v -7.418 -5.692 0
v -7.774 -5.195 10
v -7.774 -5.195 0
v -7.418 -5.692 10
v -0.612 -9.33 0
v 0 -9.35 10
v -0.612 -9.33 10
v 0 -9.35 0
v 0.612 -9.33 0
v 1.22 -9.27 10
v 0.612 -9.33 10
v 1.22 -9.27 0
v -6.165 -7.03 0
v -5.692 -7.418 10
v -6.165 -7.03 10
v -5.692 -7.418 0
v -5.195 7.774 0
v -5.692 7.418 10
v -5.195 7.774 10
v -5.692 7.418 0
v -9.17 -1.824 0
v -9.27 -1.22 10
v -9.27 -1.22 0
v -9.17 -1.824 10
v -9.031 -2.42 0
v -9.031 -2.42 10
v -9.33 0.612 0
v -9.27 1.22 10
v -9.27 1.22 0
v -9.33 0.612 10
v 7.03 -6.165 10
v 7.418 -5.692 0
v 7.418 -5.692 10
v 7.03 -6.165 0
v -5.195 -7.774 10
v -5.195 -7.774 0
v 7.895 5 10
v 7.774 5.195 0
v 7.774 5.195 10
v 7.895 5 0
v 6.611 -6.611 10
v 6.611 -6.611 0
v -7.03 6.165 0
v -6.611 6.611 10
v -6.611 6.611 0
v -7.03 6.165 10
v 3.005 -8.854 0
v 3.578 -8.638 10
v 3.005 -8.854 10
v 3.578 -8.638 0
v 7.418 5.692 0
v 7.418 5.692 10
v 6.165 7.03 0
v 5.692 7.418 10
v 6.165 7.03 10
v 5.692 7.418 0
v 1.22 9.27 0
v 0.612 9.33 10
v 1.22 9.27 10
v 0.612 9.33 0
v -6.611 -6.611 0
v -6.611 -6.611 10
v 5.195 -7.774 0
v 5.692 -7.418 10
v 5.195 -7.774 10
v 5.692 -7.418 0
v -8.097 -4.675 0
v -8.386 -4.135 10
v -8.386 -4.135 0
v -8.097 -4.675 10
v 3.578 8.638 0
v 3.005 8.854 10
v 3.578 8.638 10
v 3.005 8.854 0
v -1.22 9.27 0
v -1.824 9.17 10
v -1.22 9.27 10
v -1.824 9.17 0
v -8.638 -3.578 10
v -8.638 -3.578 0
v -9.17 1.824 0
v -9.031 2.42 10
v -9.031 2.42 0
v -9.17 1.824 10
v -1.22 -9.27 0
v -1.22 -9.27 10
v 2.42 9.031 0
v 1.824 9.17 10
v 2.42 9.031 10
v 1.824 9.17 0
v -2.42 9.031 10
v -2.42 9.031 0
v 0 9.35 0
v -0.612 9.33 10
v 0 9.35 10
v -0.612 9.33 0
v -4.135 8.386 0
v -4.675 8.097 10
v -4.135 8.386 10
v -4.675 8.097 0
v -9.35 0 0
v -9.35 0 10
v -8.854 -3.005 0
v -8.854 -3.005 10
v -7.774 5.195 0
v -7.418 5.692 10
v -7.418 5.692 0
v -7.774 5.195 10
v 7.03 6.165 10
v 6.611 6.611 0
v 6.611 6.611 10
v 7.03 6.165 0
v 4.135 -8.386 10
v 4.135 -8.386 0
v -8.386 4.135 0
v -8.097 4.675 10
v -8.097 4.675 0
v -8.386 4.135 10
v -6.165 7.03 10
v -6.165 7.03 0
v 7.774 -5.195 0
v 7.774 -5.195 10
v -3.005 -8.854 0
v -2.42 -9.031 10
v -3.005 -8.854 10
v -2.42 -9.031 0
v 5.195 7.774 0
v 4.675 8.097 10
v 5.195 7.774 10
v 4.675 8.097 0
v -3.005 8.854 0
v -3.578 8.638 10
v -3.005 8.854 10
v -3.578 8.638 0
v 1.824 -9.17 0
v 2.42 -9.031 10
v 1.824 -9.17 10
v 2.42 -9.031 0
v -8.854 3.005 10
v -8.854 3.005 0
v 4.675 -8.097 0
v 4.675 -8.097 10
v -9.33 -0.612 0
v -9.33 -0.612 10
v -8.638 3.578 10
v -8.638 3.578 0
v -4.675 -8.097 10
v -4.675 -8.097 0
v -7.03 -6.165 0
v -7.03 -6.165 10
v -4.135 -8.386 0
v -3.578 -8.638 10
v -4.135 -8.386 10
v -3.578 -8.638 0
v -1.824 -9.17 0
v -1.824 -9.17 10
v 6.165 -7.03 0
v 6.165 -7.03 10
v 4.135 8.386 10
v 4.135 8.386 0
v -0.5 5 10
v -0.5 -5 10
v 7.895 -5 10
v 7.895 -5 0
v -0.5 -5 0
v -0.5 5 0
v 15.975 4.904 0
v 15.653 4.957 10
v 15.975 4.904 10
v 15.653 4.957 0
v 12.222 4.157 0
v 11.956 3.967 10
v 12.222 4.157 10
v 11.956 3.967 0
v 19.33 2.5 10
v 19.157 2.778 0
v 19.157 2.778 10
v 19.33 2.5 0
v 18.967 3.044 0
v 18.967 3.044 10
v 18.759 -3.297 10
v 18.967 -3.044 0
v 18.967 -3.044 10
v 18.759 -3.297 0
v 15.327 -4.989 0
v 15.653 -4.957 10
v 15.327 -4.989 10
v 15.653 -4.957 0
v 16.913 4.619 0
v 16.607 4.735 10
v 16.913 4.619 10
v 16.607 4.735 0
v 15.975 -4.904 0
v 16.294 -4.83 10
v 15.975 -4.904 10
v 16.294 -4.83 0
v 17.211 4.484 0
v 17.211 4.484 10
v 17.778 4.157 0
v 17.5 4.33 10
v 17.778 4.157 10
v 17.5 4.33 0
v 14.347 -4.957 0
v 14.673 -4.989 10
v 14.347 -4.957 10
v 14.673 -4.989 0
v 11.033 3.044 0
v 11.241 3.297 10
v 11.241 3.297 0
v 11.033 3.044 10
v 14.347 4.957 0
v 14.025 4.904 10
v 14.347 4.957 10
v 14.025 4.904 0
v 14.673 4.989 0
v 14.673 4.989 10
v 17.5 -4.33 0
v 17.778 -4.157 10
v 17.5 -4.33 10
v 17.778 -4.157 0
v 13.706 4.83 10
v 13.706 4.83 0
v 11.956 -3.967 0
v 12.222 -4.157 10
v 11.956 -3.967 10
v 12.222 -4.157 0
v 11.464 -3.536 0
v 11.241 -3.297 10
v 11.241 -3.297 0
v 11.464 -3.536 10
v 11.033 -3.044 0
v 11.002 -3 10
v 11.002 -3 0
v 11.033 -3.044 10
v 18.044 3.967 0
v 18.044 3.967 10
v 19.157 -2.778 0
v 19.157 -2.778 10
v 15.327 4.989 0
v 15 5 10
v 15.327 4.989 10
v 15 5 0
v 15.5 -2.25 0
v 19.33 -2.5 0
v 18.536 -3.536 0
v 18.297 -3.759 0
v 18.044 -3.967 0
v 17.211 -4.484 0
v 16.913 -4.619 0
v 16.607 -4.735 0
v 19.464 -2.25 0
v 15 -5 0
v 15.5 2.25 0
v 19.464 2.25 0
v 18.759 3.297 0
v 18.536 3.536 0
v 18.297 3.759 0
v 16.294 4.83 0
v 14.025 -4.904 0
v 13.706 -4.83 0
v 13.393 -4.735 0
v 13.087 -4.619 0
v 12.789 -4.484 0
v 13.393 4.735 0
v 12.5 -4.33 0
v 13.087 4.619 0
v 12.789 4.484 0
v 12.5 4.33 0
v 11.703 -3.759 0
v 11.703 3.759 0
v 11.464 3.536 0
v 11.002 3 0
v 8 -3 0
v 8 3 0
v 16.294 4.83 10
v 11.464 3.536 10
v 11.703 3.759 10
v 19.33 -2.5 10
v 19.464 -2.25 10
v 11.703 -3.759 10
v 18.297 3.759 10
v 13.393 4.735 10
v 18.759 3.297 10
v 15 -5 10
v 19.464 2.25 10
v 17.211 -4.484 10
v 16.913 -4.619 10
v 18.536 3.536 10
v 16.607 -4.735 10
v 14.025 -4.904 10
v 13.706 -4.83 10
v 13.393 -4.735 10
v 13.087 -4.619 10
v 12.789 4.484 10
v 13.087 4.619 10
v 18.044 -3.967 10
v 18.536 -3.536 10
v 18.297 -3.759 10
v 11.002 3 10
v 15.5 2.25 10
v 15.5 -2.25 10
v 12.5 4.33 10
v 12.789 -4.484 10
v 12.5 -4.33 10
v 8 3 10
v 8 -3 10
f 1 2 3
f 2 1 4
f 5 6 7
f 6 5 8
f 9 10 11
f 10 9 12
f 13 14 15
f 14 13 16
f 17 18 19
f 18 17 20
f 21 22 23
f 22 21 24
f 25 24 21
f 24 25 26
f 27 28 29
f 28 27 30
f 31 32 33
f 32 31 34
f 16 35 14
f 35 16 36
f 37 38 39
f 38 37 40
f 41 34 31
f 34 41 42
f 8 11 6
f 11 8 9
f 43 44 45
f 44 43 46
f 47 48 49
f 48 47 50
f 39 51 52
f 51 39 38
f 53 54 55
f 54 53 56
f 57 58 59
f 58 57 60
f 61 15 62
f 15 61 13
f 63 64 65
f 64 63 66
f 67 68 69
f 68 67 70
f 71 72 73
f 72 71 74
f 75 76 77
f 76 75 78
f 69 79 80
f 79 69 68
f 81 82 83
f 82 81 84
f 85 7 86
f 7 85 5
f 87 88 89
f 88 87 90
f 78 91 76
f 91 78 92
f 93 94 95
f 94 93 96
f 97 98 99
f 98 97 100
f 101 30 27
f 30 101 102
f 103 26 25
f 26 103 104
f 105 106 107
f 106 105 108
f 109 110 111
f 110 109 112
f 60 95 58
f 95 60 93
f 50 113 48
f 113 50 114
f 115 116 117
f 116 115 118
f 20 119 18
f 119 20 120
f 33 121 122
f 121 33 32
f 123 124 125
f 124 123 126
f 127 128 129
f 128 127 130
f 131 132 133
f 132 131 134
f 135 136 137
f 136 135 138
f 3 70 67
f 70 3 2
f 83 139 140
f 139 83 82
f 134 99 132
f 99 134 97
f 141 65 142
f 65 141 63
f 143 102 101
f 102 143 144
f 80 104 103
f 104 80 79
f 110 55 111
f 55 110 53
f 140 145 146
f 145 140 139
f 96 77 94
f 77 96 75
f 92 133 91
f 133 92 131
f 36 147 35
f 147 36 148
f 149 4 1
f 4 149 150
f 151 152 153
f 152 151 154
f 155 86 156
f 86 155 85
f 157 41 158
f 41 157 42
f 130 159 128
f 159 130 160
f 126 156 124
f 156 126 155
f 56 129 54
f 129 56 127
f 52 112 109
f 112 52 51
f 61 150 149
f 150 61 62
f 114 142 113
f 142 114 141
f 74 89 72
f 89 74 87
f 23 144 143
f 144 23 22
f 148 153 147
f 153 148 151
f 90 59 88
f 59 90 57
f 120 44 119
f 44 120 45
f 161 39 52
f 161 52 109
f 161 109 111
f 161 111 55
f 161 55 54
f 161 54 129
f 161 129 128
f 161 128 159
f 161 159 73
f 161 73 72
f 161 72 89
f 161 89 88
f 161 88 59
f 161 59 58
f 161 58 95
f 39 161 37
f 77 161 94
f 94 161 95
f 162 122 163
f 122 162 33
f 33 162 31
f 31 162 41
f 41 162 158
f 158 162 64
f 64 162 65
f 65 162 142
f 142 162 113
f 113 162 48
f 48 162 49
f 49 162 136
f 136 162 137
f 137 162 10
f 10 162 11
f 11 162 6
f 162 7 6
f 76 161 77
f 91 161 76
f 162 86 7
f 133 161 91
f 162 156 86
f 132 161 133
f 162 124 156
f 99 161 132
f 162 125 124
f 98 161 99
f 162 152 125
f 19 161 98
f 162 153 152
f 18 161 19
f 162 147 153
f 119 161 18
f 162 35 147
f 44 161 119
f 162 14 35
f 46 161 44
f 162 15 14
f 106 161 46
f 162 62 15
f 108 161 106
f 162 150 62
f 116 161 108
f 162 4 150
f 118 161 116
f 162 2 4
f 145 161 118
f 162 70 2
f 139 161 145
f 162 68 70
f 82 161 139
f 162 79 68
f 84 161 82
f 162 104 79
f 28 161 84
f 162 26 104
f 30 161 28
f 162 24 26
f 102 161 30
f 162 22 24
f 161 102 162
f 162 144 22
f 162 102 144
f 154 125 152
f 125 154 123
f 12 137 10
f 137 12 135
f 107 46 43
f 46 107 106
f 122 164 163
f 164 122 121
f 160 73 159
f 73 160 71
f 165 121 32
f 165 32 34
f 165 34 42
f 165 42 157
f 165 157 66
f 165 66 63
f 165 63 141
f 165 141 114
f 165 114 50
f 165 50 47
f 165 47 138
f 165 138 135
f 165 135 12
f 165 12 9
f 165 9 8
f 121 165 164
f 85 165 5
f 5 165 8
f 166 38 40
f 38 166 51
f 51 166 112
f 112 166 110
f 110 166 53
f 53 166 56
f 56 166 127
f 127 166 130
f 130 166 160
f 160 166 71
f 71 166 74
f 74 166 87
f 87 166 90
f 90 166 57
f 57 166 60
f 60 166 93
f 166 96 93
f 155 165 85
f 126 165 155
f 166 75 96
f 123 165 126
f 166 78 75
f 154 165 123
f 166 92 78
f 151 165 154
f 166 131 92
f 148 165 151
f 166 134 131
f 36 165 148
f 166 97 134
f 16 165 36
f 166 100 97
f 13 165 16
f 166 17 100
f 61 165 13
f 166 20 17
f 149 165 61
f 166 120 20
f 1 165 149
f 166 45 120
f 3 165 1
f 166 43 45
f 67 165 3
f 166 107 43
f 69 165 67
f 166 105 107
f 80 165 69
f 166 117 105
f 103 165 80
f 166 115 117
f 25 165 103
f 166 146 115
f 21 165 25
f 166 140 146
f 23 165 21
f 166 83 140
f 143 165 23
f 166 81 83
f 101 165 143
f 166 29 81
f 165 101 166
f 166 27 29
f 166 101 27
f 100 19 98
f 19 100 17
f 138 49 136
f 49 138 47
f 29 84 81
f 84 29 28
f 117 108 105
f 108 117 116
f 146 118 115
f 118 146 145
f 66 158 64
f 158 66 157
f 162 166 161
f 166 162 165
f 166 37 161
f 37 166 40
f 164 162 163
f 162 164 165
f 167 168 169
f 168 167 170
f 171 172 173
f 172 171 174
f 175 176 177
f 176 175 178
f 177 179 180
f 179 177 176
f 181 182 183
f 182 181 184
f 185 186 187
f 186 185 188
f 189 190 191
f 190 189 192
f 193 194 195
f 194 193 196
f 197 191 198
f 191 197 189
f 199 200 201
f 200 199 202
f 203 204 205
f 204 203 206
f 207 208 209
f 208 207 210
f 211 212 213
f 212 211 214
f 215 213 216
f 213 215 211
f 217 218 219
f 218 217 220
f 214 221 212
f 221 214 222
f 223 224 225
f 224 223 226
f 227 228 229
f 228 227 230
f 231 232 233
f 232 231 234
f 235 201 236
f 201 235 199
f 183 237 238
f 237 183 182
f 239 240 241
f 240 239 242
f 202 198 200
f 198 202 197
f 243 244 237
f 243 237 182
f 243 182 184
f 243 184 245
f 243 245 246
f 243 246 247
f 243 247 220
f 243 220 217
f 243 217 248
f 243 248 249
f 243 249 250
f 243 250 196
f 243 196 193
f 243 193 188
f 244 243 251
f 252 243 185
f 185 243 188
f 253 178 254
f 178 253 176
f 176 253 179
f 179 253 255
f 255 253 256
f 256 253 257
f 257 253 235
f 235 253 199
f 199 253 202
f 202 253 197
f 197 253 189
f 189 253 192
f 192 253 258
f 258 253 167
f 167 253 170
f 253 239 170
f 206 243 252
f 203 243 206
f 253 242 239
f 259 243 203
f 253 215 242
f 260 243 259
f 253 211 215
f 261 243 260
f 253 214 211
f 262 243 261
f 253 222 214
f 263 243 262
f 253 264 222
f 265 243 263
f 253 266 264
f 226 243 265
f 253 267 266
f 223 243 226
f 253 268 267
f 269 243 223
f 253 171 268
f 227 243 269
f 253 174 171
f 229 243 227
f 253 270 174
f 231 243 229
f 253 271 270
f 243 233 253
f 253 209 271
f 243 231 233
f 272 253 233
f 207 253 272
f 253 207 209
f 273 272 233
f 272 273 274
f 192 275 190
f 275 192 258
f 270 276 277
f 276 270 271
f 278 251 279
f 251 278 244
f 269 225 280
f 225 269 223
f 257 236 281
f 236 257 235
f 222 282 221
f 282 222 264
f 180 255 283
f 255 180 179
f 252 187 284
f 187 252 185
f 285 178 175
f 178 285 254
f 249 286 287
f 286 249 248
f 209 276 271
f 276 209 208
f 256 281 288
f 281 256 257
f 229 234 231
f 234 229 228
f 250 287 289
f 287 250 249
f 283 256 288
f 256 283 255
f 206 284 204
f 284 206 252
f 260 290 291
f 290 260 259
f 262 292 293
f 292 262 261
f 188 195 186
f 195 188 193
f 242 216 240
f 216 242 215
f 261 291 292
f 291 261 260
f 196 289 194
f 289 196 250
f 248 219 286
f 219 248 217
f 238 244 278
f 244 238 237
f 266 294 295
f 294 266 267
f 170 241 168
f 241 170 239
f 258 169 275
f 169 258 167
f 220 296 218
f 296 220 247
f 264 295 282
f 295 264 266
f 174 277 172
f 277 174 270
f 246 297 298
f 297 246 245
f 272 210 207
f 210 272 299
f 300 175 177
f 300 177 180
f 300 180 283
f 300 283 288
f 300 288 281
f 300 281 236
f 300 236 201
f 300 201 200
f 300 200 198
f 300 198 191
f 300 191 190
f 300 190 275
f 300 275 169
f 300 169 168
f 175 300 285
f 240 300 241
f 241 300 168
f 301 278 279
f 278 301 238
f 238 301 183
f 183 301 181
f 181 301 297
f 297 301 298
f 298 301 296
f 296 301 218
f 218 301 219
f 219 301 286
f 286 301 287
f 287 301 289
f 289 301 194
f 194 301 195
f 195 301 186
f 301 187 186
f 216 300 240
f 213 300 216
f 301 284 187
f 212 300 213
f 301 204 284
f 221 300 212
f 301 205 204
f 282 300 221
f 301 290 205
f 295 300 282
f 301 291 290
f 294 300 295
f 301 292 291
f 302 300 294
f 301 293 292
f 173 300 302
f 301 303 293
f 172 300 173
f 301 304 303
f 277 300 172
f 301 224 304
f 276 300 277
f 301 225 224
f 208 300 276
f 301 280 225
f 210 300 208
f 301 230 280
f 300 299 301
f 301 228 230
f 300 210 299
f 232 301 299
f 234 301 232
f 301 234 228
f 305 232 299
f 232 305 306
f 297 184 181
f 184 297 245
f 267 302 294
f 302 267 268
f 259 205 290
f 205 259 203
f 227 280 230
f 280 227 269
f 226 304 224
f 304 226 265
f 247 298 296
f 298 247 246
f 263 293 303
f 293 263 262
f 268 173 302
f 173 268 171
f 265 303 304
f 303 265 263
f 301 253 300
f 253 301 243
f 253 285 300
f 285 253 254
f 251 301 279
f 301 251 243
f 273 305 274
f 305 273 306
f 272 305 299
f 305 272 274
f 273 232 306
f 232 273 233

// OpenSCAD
// Snap-on tubing clip for a 12.7 mm (1/2 inch) lab stand rod
// Print orientation: flat on the bed, extruded along +Z

// ---------------- Parameters ----------------
rod_d        = 12.7;   // stand rod diameter
rod_wall     = 3;      // rod ring wall thickness
rod_open     = 10;     // rod ring opening width (along Y)
rod_open_h   = 5;      // rod ring opening half-height (y = +/- 5)

tube_d       = 6;      // tubing ring inner diameter
tube_wall    = 2;      // tubing ring wall thickness
tube_open    = 4.5;    // tubing ring opening width (along Y)
tube_open_h  = 2.25;   // tubing ring opening half-height

bridge_w     = 6;      // solid bridge width (along Y)
bridge_x0    = 8;      // bridge start (X)
bridge_x1    = 12;     // bridge end (X)

eps          = 0.5;    // cutter overshoot past faces
$fn          = 96;     // curve resolution

// ---------------- Profile (in XY) ----------------
module rod_ring() {
    difference() {
        cylinder(d = rod_d + 2 * rod_wall, h = 10);
        translate([-eps, -rod_open_h, 0])
            cube([eps + rod_open, 2 * rod_open_h, 10 + eps]);
    }
}

module tube_ring() {
    difference() {
        translate([15, 0, 0])
            cylinder(d = tube_d + 2 * tube_wall, h = 10);
        translate([15 + eps, -tube_open_h, 0])
            cube([eps + tube_open, 2 * tube_open_h, 10 + eps]);
    }
}

module bridge() {
    translate([bridge_x0, -bridge_w / 2, 0])
        cube([bridge_x1 - bridge_x0, bridge_w, 10]);
}

// ---------------- Assembly ----------------
union() {
    rod_ring();
    tube_ring();
    bridge();
}
